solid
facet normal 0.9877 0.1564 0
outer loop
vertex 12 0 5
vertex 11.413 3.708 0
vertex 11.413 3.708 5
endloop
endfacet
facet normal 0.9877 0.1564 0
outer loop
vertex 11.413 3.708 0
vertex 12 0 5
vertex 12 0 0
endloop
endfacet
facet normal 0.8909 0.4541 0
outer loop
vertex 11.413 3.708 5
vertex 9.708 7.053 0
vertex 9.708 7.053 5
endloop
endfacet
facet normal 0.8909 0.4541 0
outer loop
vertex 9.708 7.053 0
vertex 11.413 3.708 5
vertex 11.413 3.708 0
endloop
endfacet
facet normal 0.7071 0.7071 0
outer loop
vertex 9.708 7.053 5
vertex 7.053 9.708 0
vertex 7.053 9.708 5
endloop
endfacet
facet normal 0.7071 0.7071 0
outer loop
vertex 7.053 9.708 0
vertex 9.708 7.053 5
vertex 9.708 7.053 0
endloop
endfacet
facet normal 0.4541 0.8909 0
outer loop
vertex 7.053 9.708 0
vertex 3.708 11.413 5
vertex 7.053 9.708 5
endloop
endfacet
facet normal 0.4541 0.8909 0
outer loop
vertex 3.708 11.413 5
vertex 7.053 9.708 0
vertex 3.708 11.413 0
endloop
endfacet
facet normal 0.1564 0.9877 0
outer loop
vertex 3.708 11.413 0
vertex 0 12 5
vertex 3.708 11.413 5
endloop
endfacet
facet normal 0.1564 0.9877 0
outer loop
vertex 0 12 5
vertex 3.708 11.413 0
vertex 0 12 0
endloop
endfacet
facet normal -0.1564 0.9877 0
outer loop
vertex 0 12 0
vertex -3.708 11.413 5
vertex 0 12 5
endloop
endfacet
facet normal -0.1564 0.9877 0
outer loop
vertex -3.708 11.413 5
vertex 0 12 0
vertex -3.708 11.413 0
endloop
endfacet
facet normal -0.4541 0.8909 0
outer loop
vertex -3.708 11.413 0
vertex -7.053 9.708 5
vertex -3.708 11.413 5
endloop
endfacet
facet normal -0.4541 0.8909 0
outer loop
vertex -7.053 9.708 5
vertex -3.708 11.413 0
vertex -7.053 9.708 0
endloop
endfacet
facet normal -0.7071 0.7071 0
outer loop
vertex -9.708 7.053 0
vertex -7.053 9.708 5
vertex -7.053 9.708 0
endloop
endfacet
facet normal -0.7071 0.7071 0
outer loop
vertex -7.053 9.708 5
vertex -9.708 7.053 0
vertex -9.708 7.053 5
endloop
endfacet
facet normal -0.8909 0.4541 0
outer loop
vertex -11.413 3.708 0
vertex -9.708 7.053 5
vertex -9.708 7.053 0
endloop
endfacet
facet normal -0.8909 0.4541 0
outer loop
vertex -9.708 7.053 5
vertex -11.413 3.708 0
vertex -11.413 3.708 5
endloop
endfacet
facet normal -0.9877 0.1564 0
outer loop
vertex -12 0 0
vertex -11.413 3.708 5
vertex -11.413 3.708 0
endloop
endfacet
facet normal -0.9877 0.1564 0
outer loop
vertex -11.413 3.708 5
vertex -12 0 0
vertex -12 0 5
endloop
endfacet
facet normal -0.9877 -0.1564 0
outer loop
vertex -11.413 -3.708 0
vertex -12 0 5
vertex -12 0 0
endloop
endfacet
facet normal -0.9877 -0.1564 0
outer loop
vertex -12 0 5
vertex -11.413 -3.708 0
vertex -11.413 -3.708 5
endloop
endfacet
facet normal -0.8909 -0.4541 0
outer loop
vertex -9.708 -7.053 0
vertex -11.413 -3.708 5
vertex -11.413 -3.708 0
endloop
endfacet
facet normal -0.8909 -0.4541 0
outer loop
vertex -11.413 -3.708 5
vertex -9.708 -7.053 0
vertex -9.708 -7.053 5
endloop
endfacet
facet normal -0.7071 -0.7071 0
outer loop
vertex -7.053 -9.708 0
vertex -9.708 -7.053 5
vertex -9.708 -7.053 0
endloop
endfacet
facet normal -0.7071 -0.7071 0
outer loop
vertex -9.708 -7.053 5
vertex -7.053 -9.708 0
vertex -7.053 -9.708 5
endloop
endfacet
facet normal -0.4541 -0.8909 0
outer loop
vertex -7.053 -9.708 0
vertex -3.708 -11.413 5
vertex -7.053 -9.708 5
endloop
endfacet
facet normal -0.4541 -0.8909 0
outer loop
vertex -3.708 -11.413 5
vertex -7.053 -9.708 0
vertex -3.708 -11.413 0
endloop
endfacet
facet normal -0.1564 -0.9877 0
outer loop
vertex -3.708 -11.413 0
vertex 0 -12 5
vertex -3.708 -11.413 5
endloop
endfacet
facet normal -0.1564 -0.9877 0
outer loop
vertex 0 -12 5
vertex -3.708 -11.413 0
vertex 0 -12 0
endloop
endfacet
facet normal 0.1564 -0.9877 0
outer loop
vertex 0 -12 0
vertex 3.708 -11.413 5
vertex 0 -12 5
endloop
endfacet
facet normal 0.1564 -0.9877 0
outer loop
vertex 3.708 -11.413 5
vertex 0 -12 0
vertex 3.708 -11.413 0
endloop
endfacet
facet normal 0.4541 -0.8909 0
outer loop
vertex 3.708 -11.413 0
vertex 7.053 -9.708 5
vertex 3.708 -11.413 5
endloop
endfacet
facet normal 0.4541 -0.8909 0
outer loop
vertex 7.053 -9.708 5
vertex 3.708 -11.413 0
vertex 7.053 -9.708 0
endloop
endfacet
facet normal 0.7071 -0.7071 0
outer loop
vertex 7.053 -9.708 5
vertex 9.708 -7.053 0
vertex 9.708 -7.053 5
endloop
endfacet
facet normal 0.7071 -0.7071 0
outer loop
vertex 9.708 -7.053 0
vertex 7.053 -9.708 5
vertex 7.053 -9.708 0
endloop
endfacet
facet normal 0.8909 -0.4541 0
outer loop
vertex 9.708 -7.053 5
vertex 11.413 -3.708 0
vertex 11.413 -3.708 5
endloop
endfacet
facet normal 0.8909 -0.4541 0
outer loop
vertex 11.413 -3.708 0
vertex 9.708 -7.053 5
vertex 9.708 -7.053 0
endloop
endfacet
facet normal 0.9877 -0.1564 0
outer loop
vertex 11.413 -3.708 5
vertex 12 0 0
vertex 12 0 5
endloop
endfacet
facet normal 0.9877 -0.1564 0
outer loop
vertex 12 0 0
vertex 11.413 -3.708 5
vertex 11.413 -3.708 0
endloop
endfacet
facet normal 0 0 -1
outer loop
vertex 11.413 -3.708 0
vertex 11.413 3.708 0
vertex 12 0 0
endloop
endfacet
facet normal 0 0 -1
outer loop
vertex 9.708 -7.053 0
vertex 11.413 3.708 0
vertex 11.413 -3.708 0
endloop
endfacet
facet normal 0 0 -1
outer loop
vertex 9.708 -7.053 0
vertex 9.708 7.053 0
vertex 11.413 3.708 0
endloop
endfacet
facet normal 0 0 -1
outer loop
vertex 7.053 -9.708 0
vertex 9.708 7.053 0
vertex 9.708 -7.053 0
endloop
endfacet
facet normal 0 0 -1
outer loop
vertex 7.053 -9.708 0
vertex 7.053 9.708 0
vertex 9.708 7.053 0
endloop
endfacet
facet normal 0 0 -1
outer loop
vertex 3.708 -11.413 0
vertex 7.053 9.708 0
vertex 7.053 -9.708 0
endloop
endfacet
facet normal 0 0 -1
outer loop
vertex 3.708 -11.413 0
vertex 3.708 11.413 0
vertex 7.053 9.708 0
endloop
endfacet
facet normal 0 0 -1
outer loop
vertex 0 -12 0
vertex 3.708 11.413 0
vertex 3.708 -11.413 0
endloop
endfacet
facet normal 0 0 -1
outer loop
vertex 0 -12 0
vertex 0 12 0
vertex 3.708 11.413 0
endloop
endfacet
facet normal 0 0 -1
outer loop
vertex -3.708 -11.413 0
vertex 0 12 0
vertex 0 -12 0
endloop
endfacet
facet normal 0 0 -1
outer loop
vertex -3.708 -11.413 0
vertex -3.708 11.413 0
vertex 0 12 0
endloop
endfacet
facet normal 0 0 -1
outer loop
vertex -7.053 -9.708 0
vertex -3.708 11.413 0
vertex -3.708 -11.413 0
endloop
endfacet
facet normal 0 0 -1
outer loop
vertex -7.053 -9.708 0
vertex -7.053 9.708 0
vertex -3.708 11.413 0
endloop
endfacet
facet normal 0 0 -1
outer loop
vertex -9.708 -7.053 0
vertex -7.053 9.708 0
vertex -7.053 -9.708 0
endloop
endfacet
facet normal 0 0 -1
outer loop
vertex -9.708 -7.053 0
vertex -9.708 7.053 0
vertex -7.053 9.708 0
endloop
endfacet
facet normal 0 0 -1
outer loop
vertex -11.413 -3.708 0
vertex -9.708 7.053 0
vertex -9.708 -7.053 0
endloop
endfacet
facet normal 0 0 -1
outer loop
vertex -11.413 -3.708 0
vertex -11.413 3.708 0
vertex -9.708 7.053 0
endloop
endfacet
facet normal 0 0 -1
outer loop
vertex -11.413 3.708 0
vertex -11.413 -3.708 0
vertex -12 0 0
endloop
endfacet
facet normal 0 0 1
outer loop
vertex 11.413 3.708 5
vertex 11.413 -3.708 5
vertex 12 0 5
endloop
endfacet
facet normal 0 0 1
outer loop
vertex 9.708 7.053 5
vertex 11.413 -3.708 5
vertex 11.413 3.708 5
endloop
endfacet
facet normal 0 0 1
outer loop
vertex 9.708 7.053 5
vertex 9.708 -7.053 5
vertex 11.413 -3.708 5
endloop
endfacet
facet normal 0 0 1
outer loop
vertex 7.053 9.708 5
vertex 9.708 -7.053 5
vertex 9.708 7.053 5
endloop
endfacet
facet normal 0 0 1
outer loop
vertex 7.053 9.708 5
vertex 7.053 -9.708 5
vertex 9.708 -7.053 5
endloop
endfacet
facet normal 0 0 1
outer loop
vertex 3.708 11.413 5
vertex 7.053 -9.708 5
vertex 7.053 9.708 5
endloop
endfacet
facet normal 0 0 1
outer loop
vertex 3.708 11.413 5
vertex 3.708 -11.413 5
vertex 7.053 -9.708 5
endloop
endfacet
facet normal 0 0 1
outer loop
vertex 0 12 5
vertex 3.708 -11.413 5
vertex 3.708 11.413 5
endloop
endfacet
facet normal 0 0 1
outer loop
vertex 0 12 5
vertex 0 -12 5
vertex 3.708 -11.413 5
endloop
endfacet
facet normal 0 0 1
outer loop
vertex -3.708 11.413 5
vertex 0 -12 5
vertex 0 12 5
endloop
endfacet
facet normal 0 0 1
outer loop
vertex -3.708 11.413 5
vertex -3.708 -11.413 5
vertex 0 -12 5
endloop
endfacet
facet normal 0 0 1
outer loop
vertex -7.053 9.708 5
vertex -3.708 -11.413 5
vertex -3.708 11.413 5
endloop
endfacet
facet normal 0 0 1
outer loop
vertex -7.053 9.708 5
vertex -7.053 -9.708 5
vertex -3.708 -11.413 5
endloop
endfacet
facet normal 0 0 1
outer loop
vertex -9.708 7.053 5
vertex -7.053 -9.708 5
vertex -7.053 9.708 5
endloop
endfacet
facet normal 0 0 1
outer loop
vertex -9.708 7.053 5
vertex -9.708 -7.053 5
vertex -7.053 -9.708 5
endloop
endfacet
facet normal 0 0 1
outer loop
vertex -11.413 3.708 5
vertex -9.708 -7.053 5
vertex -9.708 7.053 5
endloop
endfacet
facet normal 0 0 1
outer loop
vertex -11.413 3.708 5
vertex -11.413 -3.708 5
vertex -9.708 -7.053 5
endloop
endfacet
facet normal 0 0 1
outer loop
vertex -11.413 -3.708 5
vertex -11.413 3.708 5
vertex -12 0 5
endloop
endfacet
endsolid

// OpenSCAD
radius = 24.0;
height = 5.0;

/* [OpenSCAD] [Quality] */
$fn = 20;

module CylinderDispenser_Dispenser_Virgin_Hearth_Outer_Lip(diameter, height){
		cylinder(d=diameter, h=height);
}

CylinderDispenser_Dispenser_Virgin_Hearth_Outer_Lip(radius, height);
